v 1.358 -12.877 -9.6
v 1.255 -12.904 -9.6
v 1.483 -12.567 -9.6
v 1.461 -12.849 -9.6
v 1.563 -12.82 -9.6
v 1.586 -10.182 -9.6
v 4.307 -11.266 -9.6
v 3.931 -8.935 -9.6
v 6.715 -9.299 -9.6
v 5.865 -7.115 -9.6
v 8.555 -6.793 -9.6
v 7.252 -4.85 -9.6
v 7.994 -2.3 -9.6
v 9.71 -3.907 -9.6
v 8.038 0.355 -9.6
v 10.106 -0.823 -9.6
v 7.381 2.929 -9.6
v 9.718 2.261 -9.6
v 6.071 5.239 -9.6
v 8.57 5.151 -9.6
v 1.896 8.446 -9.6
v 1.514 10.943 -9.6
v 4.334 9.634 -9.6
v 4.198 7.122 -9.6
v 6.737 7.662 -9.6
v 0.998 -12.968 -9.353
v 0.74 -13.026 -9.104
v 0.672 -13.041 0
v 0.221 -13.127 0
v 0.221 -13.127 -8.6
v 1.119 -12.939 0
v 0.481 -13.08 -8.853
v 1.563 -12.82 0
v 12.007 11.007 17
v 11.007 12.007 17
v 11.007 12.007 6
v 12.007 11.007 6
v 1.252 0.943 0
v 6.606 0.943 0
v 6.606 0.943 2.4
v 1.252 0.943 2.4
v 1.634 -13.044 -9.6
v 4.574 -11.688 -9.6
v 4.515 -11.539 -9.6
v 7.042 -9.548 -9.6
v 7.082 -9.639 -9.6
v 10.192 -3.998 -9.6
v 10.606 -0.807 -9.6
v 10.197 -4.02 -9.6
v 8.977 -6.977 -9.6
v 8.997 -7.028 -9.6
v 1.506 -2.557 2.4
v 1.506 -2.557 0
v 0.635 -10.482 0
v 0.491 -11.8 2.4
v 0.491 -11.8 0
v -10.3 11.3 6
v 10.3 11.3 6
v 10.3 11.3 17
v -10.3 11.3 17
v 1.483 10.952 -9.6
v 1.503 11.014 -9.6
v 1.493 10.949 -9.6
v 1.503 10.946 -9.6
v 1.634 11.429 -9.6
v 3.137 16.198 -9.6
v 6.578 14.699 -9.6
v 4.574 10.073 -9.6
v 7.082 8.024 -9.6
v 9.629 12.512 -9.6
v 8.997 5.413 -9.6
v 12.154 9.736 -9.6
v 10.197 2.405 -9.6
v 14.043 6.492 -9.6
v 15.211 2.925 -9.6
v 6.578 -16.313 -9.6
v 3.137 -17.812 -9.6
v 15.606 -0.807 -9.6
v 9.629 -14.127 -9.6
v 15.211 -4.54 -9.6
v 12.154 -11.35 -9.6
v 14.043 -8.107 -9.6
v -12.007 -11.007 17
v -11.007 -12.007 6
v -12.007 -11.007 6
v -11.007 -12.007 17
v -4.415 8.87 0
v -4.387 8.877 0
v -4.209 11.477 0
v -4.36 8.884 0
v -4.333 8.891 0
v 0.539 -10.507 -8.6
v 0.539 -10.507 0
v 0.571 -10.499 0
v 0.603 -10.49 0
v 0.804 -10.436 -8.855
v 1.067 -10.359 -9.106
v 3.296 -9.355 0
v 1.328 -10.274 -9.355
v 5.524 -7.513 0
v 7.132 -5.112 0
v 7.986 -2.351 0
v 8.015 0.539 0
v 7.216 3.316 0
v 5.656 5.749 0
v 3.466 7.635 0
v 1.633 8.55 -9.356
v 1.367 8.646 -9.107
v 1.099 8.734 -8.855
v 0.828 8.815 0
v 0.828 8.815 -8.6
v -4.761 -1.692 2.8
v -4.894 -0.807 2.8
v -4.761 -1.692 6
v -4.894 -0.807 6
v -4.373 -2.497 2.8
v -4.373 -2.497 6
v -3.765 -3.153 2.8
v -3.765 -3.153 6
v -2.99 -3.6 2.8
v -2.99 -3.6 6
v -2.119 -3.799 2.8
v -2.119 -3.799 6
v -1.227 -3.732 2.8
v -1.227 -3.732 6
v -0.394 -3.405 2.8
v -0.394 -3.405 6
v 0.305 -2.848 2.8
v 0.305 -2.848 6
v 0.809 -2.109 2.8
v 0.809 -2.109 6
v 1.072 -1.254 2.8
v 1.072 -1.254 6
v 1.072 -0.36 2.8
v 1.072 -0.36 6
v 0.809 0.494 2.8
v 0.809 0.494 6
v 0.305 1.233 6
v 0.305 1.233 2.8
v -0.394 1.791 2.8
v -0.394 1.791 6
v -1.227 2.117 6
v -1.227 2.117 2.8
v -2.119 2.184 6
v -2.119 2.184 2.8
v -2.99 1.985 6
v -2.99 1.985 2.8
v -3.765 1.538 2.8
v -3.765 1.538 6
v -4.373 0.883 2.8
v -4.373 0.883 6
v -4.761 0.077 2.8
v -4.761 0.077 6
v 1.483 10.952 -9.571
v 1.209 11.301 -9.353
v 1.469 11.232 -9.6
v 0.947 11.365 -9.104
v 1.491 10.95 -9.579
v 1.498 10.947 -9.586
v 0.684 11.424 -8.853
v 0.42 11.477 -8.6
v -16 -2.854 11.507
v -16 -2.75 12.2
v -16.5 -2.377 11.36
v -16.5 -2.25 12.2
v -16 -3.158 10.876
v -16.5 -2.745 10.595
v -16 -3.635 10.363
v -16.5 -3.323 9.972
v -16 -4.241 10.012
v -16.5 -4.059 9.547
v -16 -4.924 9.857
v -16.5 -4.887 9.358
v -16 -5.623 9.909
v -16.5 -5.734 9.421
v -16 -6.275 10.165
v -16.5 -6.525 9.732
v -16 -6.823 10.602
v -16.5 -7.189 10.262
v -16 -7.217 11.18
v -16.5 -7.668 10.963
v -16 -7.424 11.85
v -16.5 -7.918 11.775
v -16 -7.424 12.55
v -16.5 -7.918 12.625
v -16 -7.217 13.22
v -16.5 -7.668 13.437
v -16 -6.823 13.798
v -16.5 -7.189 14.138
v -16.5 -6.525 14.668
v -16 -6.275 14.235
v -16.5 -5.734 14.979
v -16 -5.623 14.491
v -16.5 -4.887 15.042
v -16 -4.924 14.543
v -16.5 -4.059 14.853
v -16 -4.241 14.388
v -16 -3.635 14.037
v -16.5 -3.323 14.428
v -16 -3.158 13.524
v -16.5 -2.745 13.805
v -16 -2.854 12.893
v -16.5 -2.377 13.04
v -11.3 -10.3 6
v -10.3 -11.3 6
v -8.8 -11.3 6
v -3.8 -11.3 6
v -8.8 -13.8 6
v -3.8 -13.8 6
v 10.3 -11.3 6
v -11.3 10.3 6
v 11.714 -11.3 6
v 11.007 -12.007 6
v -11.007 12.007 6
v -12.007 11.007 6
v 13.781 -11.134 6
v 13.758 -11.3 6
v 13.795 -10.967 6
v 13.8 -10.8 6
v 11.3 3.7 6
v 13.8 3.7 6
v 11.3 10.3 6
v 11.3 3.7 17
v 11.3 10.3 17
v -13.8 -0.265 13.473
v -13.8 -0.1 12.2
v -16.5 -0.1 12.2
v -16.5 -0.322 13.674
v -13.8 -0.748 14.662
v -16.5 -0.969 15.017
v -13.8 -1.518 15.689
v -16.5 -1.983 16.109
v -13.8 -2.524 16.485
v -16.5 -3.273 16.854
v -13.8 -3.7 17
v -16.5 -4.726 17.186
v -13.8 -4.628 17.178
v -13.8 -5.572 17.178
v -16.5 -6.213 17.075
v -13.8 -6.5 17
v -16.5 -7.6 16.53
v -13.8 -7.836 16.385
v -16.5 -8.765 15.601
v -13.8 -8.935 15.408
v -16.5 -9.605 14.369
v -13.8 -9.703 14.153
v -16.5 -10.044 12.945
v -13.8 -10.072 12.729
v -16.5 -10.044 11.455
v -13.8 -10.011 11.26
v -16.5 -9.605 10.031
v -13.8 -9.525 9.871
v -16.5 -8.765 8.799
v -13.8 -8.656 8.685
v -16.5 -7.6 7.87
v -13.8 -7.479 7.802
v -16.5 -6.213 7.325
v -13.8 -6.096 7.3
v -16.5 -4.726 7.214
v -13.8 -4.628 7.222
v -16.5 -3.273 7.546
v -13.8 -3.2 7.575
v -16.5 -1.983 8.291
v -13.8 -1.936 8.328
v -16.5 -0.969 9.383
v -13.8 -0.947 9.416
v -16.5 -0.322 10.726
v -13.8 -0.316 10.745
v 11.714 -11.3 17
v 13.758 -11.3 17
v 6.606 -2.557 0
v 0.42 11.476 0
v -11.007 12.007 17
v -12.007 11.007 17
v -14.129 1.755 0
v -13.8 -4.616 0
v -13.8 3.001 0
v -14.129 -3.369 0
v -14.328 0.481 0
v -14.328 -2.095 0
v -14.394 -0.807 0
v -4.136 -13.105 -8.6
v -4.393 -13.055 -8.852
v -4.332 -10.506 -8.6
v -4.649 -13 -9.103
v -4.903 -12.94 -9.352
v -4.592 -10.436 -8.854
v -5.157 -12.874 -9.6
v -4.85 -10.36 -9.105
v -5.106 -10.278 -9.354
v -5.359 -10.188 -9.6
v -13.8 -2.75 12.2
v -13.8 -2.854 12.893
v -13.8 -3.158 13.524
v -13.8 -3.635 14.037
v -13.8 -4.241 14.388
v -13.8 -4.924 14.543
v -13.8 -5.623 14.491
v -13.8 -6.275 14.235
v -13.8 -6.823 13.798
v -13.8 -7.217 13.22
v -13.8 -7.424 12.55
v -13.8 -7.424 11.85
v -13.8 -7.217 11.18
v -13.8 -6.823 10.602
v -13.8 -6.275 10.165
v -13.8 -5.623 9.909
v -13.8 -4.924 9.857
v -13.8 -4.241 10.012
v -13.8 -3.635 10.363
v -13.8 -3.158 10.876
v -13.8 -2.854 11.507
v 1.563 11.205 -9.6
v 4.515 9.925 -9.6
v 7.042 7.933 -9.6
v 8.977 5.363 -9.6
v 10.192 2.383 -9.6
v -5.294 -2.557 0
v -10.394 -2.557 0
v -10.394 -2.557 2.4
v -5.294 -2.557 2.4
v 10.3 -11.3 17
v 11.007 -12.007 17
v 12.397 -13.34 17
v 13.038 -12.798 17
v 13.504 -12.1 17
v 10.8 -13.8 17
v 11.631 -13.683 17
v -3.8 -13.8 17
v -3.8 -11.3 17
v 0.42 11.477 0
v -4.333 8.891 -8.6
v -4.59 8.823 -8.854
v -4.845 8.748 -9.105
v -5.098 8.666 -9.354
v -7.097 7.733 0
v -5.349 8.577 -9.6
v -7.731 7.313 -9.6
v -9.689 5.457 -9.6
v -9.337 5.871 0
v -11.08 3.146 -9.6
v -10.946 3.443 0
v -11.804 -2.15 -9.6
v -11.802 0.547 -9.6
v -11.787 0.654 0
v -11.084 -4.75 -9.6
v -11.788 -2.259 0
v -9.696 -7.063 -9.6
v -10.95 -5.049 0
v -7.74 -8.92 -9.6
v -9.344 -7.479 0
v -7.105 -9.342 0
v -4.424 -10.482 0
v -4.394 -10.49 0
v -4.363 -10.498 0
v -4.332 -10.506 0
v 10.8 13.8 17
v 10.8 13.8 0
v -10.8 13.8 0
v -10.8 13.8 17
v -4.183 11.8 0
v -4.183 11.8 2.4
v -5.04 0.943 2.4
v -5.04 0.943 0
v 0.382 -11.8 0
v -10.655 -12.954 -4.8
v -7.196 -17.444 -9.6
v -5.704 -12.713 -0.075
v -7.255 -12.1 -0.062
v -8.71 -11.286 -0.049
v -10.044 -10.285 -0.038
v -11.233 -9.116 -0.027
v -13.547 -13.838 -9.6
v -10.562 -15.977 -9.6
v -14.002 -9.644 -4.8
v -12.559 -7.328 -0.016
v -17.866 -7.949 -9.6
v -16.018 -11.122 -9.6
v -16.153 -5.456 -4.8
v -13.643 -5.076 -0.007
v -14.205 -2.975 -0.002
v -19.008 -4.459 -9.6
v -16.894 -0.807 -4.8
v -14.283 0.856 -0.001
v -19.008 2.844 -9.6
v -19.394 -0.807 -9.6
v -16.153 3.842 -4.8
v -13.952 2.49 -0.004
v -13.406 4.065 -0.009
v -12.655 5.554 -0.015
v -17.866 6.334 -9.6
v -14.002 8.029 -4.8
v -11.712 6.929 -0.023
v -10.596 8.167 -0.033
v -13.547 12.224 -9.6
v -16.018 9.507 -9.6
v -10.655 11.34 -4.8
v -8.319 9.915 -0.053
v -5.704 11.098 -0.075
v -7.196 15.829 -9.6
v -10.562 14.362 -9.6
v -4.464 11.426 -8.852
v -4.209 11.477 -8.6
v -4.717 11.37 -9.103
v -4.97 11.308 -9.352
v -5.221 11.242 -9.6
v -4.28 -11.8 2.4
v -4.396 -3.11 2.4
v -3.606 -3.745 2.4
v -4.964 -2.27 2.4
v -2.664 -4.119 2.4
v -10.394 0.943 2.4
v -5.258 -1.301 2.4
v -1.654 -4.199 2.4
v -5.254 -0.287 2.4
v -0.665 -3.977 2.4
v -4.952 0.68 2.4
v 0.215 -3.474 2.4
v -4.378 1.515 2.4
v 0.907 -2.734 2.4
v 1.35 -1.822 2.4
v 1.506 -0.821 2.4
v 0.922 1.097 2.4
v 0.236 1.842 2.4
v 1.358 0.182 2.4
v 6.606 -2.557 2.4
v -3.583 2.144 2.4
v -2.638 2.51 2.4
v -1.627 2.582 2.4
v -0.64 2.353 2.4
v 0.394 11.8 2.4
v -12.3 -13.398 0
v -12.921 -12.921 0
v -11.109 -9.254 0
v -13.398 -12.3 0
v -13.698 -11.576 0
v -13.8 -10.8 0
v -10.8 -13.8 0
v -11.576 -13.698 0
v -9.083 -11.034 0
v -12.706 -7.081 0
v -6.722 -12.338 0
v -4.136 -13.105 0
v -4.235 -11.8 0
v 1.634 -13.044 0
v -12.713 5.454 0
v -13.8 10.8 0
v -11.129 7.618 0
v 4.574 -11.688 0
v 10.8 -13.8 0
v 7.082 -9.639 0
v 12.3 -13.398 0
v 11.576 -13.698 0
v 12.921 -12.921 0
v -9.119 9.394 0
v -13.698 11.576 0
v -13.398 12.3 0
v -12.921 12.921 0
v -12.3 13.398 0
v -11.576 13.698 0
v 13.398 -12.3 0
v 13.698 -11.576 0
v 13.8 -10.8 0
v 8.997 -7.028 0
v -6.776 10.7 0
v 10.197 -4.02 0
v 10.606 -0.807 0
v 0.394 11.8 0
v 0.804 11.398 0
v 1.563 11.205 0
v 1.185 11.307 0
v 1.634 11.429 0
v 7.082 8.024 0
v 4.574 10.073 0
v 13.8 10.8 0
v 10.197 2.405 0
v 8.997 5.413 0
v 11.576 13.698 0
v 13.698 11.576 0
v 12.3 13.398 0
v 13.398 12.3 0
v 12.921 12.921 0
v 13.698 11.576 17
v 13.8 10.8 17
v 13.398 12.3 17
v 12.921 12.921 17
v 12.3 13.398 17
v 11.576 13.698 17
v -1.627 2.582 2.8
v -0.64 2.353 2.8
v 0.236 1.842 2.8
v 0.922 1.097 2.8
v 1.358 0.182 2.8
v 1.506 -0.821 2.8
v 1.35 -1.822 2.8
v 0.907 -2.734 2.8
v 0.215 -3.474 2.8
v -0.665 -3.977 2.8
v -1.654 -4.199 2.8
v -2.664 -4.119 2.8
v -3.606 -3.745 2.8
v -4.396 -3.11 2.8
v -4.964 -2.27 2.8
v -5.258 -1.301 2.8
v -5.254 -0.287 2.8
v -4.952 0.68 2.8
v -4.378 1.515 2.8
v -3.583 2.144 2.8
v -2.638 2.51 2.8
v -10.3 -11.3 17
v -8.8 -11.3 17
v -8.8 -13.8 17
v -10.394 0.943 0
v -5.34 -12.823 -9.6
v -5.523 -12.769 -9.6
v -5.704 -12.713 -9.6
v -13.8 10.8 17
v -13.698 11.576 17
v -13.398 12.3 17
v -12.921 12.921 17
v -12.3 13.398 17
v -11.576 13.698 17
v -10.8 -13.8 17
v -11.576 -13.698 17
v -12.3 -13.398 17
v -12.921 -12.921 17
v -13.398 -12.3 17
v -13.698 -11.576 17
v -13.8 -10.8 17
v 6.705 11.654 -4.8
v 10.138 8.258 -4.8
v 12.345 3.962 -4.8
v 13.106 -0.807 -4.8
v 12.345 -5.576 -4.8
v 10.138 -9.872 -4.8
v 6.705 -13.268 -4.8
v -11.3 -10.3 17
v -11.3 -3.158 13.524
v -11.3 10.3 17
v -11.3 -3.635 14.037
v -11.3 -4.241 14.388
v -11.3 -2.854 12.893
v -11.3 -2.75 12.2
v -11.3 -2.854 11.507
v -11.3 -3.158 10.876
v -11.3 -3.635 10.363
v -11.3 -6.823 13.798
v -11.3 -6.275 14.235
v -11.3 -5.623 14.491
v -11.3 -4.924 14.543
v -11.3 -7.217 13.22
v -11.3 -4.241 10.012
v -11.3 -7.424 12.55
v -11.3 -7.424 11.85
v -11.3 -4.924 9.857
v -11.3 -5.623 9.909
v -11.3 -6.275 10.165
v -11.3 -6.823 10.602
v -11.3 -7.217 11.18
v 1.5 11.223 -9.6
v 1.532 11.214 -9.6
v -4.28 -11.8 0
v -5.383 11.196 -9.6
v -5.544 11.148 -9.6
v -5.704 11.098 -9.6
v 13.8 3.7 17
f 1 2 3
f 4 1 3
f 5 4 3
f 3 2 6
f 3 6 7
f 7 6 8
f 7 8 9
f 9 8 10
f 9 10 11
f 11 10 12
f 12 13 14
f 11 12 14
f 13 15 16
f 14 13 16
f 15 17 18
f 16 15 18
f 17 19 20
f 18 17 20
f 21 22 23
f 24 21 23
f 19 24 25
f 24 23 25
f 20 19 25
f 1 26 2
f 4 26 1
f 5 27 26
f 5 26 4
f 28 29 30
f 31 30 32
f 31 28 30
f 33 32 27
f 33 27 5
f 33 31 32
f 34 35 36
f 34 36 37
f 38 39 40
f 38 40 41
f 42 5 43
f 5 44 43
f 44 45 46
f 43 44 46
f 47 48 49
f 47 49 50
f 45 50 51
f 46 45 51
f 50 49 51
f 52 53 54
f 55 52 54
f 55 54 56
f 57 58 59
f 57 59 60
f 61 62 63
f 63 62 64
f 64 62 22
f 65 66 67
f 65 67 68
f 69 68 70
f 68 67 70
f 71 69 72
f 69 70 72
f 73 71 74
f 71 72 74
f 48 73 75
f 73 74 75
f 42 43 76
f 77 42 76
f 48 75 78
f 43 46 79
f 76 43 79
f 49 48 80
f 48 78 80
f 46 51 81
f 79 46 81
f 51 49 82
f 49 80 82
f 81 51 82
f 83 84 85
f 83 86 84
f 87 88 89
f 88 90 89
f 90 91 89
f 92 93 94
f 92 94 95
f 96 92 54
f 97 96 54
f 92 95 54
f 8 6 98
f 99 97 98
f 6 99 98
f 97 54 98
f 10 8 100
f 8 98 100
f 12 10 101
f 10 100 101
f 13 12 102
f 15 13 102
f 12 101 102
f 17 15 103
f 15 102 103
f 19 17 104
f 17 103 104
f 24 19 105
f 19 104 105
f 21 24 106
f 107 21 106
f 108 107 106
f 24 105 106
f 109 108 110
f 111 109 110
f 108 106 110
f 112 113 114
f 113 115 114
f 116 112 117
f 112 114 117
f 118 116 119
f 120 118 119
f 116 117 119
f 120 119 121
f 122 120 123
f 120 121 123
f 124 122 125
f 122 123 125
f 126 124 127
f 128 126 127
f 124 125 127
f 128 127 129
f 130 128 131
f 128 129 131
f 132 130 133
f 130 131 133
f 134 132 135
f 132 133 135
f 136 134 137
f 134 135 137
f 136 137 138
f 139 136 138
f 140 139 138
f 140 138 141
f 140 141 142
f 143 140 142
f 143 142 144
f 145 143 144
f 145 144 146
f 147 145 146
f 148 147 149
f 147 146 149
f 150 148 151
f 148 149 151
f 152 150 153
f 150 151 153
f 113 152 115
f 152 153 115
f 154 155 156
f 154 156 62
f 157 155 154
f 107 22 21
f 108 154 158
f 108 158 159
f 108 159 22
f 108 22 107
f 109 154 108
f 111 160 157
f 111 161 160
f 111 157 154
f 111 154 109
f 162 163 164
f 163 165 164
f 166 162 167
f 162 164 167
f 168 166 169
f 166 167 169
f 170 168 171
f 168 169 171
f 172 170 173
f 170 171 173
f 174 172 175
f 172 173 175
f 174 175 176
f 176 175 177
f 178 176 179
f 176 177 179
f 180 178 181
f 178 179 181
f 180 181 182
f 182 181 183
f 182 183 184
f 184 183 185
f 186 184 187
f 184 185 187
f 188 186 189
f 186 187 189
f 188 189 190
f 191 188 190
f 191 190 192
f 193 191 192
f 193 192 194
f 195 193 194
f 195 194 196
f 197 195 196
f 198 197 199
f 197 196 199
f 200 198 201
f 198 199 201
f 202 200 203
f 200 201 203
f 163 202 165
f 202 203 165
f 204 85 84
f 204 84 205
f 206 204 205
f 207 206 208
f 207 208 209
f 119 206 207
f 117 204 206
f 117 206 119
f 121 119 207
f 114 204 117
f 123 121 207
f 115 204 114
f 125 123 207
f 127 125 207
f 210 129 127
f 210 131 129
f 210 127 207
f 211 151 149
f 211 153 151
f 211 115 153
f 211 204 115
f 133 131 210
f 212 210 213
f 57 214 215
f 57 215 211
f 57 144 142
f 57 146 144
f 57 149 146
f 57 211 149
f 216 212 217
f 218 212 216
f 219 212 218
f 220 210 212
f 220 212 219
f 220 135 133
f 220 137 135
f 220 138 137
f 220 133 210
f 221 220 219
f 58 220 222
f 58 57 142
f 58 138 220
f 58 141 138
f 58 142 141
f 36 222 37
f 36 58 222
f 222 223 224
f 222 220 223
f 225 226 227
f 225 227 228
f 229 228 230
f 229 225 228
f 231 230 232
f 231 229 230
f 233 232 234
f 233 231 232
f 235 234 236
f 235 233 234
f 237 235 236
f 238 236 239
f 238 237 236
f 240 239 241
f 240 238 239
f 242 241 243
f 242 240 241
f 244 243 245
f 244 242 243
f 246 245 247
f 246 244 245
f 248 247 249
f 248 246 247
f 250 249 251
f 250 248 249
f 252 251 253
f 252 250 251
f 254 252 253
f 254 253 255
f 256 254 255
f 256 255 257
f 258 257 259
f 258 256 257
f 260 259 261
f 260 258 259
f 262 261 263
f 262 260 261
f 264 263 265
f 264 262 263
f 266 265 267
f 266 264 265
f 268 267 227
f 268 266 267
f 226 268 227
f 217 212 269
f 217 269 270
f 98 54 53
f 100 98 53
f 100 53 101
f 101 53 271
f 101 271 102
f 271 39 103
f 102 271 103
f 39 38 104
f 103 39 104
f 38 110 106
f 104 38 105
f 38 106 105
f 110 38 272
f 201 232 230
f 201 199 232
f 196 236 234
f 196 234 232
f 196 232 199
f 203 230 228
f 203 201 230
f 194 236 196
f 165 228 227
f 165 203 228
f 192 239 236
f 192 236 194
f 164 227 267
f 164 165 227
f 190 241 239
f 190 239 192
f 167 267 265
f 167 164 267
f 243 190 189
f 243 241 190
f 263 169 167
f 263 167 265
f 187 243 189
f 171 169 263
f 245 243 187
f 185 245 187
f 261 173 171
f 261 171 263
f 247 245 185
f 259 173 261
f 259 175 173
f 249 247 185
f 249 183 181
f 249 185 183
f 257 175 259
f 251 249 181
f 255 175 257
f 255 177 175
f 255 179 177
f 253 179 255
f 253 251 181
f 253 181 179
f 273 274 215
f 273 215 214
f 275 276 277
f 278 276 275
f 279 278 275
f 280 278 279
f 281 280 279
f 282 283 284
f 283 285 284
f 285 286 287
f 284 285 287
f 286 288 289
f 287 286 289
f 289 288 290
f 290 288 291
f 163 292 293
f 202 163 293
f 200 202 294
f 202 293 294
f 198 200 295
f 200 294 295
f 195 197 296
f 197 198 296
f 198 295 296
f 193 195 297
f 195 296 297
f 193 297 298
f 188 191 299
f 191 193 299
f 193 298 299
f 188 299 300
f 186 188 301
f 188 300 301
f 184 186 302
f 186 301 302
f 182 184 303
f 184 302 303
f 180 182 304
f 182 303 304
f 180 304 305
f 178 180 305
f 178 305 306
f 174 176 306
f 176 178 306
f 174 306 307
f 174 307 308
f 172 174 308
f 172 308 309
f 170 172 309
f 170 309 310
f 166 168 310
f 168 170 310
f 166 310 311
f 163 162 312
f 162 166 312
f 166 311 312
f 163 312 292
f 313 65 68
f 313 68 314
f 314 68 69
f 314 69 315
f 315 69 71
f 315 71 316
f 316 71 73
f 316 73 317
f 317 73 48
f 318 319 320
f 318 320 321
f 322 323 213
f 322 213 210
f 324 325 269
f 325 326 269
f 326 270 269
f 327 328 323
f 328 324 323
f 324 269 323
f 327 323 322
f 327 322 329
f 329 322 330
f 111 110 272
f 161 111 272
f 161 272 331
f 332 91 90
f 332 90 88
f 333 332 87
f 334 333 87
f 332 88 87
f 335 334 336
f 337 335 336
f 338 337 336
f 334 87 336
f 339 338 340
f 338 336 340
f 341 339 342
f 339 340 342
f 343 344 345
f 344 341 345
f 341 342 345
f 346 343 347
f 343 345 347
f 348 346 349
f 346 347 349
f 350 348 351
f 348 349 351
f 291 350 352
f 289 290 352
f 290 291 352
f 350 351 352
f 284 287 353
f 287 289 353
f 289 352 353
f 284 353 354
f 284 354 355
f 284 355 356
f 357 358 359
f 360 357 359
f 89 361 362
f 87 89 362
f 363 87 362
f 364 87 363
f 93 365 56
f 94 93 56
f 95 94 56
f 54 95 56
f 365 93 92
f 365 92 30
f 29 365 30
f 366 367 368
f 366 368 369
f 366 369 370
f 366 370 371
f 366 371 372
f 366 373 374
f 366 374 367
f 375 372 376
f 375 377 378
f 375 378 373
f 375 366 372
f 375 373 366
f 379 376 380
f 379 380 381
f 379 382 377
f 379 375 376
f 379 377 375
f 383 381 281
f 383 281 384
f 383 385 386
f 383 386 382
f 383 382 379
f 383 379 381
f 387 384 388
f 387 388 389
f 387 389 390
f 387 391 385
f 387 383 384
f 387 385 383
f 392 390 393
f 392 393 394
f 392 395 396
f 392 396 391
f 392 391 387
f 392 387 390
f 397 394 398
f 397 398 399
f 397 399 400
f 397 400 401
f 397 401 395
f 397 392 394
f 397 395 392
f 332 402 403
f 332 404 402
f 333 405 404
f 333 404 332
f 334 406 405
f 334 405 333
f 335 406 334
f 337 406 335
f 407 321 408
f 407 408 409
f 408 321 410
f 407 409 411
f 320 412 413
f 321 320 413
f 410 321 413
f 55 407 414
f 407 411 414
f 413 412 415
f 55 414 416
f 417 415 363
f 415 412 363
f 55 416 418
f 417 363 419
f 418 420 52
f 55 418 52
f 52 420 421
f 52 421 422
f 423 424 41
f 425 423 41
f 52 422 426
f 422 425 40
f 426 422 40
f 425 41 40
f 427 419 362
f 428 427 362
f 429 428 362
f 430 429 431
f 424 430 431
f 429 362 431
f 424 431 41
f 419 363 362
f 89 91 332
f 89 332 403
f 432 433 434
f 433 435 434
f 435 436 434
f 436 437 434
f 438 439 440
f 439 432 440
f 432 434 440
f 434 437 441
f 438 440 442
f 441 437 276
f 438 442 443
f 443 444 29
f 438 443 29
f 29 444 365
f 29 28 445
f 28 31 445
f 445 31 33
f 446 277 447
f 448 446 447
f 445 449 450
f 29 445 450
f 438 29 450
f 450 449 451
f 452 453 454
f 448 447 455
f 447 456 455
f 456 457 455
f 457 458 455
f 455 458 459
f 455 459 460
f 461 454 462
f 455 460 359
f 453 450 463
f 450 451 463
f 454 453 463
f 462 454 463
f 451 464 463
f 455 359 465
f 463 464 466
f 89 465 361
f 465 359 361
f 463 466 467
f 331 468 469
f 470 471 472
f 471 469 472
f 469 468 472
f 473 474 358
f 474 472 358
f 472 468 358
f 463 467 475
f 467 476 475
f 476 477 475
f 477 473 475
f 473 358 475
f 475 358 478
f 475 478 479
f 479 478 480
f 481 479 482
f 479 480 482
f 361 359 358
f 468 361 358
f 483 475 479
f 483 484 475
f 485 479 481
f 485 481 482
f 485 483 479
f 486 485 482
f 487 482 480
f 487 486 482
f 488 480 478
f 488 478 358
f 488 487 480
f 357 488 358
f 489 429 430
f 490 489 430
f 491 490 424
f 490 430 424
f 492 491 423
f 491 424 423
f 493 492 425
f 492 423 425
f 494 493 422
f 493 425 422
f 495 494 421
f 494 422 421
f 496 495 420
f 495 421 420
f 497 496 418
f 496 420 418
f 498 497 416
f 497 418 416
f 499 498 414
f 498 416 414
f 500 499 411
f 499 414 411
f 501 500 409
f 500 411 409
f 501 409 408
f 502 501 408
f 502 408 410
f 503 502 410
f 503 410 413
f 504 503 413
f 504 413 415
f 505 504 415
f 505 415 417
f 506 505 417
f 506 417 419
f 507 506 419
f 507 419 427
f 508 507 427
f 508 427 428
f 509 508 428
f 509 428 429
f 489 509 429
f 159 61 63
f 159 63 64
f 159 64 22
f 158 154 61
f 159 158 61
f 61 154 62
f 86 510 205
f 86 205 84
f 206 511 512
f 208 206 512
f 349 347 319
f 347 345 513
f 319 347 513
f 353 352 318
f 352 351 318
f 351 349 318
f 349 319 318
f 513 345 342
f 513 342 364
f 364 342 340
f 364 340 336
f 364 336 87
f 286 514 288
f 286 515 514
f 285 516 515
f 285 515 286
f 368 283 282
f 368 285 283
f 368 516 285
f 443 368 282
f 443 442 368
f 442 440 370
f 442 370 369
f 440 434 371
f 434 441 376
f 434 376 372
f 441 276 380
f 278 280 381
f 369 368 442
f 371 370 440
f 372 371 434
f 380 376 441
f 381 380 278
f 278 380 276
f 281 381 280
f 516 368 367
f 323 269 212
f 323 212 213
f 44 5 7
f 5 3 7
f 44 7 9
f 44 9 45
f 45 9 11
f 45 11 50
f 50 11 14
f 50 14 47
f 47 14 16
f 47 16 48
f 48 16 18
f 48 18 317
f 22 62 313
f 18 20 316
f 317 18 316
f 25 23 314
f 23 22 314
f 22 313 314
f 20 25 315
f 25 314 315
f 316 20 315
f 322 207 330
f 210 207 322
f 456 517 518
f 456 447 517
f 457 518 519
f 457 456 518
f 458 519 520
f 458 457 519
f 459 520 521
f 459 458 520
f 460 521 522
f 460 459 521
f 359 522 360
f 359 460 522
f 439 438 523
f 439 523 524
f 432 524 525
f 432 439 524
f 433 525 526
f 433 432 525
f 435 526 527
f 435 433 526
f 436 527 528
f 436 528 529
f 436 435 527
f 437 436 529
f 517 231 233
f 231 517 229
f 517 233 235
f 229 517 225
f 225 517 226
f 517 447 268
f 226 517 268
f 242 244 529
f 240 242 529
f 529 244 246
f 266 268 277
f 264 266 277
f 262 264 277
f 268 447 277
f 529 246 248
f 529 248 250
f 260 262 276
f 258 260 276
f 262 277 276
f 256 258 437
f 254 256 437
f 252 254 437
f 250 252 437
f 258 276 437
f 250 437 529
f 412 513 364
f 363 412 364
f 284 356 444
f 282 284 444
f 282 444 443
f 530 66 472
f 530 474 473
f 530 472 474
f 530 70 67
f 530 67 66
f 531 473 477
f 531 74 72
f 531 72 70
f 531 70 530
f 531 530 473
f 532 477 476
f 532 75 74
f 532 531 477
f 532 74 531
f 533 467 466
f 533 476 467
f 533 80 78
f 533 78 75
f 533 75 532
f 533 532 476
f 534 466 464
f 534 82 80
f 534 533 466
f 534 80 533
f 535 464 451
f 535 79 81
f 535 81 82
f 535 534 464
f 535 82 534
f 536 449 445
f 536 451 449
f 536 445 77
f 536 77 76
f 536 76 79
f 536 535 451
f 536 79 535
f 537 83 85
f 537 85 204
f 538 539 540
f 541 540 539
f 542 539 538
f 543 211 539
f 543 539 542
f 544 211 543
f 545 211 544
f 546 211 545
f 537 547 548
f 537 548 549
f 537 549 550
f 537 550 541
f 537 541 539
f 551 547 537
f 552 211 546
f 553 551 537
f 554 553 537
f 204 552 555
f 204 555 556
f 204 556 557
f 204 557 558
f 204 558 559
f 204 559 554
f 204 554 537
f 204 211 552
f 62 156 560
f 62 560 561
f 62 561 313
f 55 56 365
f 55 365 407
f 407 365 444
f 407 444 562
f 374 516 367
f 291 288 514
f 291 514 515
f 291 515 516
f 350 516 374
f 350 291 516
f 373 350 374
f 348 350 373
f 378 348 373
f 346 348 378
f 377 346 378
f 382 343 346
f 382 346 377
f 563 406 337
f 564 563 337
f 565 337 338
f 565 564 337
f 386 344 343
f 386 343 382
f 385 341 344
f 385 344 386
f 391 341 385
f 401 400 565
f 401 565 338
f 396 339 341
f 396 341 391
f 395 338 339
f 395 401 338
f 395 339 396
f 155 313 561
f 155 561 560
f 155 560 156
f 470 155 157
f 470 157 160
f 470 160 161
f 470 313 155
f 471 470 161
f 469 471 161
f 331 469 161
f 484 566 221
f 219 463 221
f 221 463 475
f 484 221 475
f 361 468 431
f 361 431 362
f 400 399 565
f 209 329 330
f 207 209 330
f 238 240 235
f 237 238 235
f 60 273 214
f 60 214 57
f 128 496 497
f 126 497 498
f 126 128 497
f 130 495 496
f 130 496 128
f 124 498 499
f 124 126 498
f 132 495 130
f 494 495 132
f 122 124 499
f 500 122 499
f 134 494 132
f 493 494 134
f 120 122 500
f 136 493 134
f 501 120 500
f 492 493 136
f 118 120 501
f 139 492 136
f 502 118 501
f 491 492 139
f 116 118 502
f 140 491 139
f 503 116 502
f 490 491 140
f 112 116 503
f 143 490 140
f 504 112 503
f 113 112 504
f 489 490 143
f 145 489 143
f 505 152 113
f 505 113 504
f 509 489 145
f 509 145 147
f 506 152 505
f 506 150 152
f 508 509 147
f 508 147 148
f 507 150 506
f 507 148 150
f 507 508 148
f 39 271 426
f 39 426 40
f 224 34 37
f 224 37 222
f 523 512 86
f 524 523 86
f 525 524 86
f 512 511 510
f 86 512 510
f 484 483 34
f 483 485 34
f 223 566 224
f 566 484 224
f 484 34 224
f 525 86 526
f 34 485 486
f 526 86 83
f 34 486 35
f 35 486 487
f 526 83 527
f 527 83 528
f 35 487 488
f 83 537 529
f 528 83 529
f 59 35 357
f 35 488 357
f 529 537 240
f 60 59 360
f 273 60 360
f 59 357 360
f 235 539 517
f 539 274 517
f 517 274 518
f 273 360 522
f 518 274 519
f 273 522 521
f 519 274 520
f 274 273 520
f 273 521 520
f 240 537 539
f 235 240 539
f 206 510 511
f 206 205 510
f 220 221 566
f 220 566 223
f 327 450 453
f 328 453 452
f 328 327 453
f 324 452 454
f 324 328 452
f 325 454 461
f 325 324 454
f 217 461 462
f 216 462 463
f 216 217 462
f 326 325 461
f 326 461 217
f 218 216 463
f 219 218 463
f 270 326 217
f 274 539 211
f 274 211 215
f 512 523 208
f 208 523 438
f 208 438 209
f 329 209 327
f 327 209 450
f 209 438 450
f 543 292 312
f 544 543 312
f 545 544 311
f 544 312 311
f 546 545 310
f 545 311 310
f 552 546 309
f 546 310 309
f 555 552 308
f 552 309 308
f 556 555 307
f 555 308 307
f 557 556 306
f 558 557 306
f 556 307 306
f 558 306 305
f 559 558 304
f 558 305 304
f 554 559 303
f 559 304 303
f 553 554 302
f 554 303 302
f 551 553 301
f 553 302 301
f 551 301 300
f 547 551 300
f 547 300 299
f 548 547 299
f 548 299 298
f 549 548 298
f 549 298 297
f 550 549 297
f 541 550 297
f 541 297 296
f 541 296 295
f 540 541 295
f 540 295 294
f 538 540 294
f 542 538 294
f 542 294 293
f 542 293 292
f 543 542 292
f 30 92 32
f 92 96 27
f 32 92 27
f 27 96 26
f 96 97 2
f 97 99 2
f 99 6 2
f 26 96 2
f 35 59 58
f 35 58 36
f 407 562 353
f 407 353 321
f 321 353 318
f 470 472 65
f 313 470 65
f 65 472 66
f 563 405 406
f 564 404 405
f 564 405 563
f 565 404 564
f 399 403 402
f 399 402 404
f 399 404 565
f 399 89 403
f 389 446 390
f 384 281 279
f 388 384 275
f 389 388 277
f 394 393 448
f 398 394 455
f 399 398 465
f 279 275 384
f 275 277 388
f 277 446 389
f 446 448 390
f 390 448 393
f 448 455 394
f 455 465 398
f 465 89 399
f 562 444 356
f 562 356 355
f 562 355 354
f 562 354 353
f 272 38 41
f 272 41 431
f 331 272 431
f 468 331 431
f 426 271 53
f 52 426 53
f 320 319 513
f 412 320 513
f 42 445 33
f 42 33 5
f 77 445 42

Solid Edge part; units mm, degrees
sketch "Sketch1" plane through (0, 0, 0) normal (0, 0, 1) x (1, 0, 0)
  line L0 (-13.8, -13.8) -> (13.8, -13.8)
  line L1 (13.8, -13.8) -> (13.8, 13.8)
  line L2 (13.8, 13.8) -> (-13.8, 13.8)
  line L3 (-13.8, 13.8) -> (-13.8, -13.8)
  dimension "D1" = 27.6
  dimension "D2" = 27.6
extrude "Protrusion1" add sketch "Sketch1" along normal blind 6
sketch "Sketch2" plane through (0, 0, 6) normal (0, 0, 1) x (1, 0, 0)
  line L0 (13.8, -11.3) -> (13.8, -13.8)
  line L1 (-11.3, -11.3) -> (13.8, -11.3)
  line L2 (-11.3, 11.3) -> (-11.3, -11.3)
  line L3 (11.3, 11.3) -> (-11.3, 11.3)
  line L4 (11.3, 3.7) -> (11.3, 11.3)
  line L5 (13.8, 3.7) -> (11.3, 3.7)
  line L6 (13.8, 13.8) -> (13.8, 3.7)
  line L7 (-13.8, 13.8) -> (13.8, 13.8)
  line L8 (-13.8, -13.8) -> (-13.8, 13.8)
  line L9 (13.8, -13.8) -> (-13.8, -13.8)
  dimension "D1" = 2.5
  dimension "D2" = 2.5
  dimension "D3" = 2.5
  dimension "D4" = 15
  dimension "D5" = 2.5
extrude "servo_holding" add sketch "Sketch2" along normal blind 11
sketch "Sketch3" plane through (1.25, 0, 5) normal (0, 0, 1) x (1, 0, 0)
  circle A0 centre (-3.1444, -0.8073) radius 1.25
  dimension "D1" = 2.5
extrude "Cutout1" cut sketch "Sketch3" against normal through all
sketch "Sketch4" plane through (0, 0, 17) normal (0, 0, 1) x (-1, 0, 0)
  line L0 (8.8, 13.8) -> (3.8, 13.8)
  line L1 (3.8, 13.8) -> (3.8, 11.3)
  line L2 (3.8, 11.3) -> (8.8, 11.3)
  line L3 (8.8, 11.3) -> (8.8, 13.8)
  dimension "D1" = 5
  dimension "D2" = 2.5
extrude "Cutout2" cut sketch "Sketch4" against normal up to vertex (11 mm away)
sketch "Sketch5" plane through (-13.8, 0, 8) normal (-1, 0, 0) x (0, 1, 0)
  circle A0 centre (-5.1, -4.2) radius 2.35
  circle A1 centre (-5.1, -4.2) radius 5
  dimension "D1" = 8.7
  dimension "D2" = 12.2
  dimension "D3" = 4.7
  dimension "D4" = 10
extrude "side_axis_mounting" add sketch "Sketch5" along normal blind 2.7
sketch "Sketch6" plane through (-16.5, -5.1, 11.2) normal (-1, 0, 0) x (0, 1, 0)
  circle A0 centre (0, -1) radius 2.35
extrude "Cutout3" cut sketch "Sketch6" against normal up to next
fillet "edges" radius 3 4 edges at (-13.8, -13.8, 8.5) (13.8, -13.8, 8.5) (13.8, 13.8, 8.5) (-13.8, 13.8, 8.5)
sketch "Sketch7" plane through (0, 0, 0) normal (0, 0, -1) x (0, 1, 0)
  line L0 (-2.5573, 6.6056) -> (0.9427, 6.6056)
  line L1 (0.9427, 6.6056) -> (0.9427, 1.2516)
  line L2 (0.9427, 1.2516) -> (11.8, 0.3945)
  line L3 (11.8, 0.3945) -> (11.8, -4.1833)
  line L4 (11.8, -4.1833) -> (0.9427, -5.0404)
  line L5 (0.9427, -10.3944) -> (0.9427, -5.0404)
  line L6 (-2.5573, -10.3944) -> (0.9427, -10.3944)
  line L7 (-2.5573, -10.3944) -> (-2.5573, -5.2944)
  line L8 (-11.8, -4.2795) -> (-2.5573, -5.2944)
  line L9 (-11.8, 0.4907) -> (-11.8, -4.2795)
  line L10 (-2.5573, 1.5056) -> (-11.8, 0.4907)
  line L11 (-2.5573, 6.6056) -> (-2.5573, 1.5056)
  dimension "D1" = 3.5
  dimension "D2" = 3.9
  dimension "D3" = 6.8
  dimension "D4" = 4
  dimension "D5" = 7.2
  dimension "D6" = 17
  dimension "D7" = 16.9
  dimension "D8" = 14.5
  dimension "D9" = 2
  dimension "D10" = 2
extrude "servo_cut" cut sketch "Sketch7" against normal blind 2.4
sketch "Sketch8" plane through (1.25, -1.25, 6) normal (0, 0, 1) x (-1, 0, 0)
  circle A0 centre (3.1444, -0.4427) radius 3
  dimension "D1" = 6
extrude "servo_screw_cut" cut sketch "Sketch8" against normal blind 5
sketch "Sketch9" plane through (-1.8944, 0, 2.4) normal (0, 0, -1) x (0.0787, 0.9969, 0)
  circle A0 centre (-0.8048, 0.0635) radius 3.4
  dimension "D1" = 6.8
extrude "Cutout4" cut sketch "Sketch9" against normal blind 0.4
sketch "Sketch10" plane through (0, 0, 0) normal (0, 0, -1) x (0, 1, 0)
  line L0 (-10.5067, 0.5392) -> (-13.1271, 0.2207)
  arc A0 (-13.1271, 0.2207) -> (11.4765, 0.42) centre (-0.8073, -1.8944) cw
  line L1 (8.815, 0.828) -> (11.4765, 0.42)
  arc A1 (-10.5067, 0.5392) -> (8.815, 0.828) centre (-0.8073, -1.8944) cw
  line L2 (-10.5056, -4.3325) -> (-13.1047, -4.1363)
  arc A2 (-13.1047, -4.1363) -> (11.4765, -4.2088) centre (-0.8073, -1.8944) ccw
  line L3 (8.8909, -4.3325) -> (11.4765, -4.2088)
  arc A3 (-10.5056, -4.3325) -> (8.8909, -4.3325) centre (-0.8073, -1.8944) ccw
  dimension "D1" = 12.5
  dimension "D2" = 25
  dimension "D3" = 20
  dimension "D4" = 10
extrude "Extrusionsausprägung_4" add sketch "Sketch10" along normal blind 9.6
chamfer "Fase_1" distance 1 angle 45 4 edges at (0.3799, -11.8169, -9.6) (0.624, 10.1457, -9.6) (-4.2706, 10.1837, -9.6) (-4.2344, -11.8051, -9.6)
sketch "Sketch11" plane through (0, -0.8073, 8.5) normal (0, -1, 0) x (-1, 0, 0)
  line L0 (14.3944, 8.5) -> (19.3944, 18.1)
  line L1 (19.3944, 18.1) -> (14.3944, 18.1)
  line L2 (14.3944, 18.1) -> (14.3944, 8.5)
  dimension "D1" = 5
revolve "Rotationsausprägung_3" add sketch "Sketch11" angle 145 mid plane about axis through (-1.9507, -0.8073, -9.6) along (0, 0, 1)
sketch "Sketch12" plane through (0, 0, 17) normal (0, 0, 1) x (1, 0, 0)
  line L0 (10.3, 11.3) -> (11.3, 11.3)
  line L1 (11.3, 11.3) -> (11.3, 10.3)
  line L2 (12.0071, 11.0071) -> (11.3, 10.3)
  line L3 (11.0071, 12.0071) -> (12.0071, 11.0071)
  line L4 (10.3, 11.3) -> (11.0071, 12.0071)
  dimension "D1" = 1
  dimension "D2" = 1
extrude "Cutout5" cut sketch "Sketch12" against normal up to vertex (11 mm away)
mirror "Mirror1" about plane through (0, 0, 0) normal (1, 0, 0) of "Cutout5"
mirror "Mirror2" about plane through (0, 0, 0) normal (0, -1, 0) of "Cutout5", "Mirror1"
chamfer "Fase_2" distance 0.5 angle 45 1 edges at (-16.5, -7.45, 12.2)
sketch "Sketch13" plane through (0, -0.8073, 8.5) normal (0, -1, 0) x (-1, 0, 0)
  line L0 (-10.6056, 18.1) -> (-15.6056, 18.1)
  line L1 (-15.6056, 18.1) -> (-10.6056, 8.5)
  line L2 (-10.6056, 8.5) -> (-10.1056, 8.5)
  line L3 (-10.1056, 8.5) -> (-10.1056, 18.1)
  line L4 (-10.1056, 18.1) -> (-10.6056, 18.1)
  dimension "D1" = 5
  dimension "D2" = 0.5
revolve "Rotationsausprägung_5" add sketch "Sketch13" angle 145 mid plane about axis through (-2.2246, -0.8073, -9.6) along (0, 0, 1)
properties material "Nylon, allgemein"
